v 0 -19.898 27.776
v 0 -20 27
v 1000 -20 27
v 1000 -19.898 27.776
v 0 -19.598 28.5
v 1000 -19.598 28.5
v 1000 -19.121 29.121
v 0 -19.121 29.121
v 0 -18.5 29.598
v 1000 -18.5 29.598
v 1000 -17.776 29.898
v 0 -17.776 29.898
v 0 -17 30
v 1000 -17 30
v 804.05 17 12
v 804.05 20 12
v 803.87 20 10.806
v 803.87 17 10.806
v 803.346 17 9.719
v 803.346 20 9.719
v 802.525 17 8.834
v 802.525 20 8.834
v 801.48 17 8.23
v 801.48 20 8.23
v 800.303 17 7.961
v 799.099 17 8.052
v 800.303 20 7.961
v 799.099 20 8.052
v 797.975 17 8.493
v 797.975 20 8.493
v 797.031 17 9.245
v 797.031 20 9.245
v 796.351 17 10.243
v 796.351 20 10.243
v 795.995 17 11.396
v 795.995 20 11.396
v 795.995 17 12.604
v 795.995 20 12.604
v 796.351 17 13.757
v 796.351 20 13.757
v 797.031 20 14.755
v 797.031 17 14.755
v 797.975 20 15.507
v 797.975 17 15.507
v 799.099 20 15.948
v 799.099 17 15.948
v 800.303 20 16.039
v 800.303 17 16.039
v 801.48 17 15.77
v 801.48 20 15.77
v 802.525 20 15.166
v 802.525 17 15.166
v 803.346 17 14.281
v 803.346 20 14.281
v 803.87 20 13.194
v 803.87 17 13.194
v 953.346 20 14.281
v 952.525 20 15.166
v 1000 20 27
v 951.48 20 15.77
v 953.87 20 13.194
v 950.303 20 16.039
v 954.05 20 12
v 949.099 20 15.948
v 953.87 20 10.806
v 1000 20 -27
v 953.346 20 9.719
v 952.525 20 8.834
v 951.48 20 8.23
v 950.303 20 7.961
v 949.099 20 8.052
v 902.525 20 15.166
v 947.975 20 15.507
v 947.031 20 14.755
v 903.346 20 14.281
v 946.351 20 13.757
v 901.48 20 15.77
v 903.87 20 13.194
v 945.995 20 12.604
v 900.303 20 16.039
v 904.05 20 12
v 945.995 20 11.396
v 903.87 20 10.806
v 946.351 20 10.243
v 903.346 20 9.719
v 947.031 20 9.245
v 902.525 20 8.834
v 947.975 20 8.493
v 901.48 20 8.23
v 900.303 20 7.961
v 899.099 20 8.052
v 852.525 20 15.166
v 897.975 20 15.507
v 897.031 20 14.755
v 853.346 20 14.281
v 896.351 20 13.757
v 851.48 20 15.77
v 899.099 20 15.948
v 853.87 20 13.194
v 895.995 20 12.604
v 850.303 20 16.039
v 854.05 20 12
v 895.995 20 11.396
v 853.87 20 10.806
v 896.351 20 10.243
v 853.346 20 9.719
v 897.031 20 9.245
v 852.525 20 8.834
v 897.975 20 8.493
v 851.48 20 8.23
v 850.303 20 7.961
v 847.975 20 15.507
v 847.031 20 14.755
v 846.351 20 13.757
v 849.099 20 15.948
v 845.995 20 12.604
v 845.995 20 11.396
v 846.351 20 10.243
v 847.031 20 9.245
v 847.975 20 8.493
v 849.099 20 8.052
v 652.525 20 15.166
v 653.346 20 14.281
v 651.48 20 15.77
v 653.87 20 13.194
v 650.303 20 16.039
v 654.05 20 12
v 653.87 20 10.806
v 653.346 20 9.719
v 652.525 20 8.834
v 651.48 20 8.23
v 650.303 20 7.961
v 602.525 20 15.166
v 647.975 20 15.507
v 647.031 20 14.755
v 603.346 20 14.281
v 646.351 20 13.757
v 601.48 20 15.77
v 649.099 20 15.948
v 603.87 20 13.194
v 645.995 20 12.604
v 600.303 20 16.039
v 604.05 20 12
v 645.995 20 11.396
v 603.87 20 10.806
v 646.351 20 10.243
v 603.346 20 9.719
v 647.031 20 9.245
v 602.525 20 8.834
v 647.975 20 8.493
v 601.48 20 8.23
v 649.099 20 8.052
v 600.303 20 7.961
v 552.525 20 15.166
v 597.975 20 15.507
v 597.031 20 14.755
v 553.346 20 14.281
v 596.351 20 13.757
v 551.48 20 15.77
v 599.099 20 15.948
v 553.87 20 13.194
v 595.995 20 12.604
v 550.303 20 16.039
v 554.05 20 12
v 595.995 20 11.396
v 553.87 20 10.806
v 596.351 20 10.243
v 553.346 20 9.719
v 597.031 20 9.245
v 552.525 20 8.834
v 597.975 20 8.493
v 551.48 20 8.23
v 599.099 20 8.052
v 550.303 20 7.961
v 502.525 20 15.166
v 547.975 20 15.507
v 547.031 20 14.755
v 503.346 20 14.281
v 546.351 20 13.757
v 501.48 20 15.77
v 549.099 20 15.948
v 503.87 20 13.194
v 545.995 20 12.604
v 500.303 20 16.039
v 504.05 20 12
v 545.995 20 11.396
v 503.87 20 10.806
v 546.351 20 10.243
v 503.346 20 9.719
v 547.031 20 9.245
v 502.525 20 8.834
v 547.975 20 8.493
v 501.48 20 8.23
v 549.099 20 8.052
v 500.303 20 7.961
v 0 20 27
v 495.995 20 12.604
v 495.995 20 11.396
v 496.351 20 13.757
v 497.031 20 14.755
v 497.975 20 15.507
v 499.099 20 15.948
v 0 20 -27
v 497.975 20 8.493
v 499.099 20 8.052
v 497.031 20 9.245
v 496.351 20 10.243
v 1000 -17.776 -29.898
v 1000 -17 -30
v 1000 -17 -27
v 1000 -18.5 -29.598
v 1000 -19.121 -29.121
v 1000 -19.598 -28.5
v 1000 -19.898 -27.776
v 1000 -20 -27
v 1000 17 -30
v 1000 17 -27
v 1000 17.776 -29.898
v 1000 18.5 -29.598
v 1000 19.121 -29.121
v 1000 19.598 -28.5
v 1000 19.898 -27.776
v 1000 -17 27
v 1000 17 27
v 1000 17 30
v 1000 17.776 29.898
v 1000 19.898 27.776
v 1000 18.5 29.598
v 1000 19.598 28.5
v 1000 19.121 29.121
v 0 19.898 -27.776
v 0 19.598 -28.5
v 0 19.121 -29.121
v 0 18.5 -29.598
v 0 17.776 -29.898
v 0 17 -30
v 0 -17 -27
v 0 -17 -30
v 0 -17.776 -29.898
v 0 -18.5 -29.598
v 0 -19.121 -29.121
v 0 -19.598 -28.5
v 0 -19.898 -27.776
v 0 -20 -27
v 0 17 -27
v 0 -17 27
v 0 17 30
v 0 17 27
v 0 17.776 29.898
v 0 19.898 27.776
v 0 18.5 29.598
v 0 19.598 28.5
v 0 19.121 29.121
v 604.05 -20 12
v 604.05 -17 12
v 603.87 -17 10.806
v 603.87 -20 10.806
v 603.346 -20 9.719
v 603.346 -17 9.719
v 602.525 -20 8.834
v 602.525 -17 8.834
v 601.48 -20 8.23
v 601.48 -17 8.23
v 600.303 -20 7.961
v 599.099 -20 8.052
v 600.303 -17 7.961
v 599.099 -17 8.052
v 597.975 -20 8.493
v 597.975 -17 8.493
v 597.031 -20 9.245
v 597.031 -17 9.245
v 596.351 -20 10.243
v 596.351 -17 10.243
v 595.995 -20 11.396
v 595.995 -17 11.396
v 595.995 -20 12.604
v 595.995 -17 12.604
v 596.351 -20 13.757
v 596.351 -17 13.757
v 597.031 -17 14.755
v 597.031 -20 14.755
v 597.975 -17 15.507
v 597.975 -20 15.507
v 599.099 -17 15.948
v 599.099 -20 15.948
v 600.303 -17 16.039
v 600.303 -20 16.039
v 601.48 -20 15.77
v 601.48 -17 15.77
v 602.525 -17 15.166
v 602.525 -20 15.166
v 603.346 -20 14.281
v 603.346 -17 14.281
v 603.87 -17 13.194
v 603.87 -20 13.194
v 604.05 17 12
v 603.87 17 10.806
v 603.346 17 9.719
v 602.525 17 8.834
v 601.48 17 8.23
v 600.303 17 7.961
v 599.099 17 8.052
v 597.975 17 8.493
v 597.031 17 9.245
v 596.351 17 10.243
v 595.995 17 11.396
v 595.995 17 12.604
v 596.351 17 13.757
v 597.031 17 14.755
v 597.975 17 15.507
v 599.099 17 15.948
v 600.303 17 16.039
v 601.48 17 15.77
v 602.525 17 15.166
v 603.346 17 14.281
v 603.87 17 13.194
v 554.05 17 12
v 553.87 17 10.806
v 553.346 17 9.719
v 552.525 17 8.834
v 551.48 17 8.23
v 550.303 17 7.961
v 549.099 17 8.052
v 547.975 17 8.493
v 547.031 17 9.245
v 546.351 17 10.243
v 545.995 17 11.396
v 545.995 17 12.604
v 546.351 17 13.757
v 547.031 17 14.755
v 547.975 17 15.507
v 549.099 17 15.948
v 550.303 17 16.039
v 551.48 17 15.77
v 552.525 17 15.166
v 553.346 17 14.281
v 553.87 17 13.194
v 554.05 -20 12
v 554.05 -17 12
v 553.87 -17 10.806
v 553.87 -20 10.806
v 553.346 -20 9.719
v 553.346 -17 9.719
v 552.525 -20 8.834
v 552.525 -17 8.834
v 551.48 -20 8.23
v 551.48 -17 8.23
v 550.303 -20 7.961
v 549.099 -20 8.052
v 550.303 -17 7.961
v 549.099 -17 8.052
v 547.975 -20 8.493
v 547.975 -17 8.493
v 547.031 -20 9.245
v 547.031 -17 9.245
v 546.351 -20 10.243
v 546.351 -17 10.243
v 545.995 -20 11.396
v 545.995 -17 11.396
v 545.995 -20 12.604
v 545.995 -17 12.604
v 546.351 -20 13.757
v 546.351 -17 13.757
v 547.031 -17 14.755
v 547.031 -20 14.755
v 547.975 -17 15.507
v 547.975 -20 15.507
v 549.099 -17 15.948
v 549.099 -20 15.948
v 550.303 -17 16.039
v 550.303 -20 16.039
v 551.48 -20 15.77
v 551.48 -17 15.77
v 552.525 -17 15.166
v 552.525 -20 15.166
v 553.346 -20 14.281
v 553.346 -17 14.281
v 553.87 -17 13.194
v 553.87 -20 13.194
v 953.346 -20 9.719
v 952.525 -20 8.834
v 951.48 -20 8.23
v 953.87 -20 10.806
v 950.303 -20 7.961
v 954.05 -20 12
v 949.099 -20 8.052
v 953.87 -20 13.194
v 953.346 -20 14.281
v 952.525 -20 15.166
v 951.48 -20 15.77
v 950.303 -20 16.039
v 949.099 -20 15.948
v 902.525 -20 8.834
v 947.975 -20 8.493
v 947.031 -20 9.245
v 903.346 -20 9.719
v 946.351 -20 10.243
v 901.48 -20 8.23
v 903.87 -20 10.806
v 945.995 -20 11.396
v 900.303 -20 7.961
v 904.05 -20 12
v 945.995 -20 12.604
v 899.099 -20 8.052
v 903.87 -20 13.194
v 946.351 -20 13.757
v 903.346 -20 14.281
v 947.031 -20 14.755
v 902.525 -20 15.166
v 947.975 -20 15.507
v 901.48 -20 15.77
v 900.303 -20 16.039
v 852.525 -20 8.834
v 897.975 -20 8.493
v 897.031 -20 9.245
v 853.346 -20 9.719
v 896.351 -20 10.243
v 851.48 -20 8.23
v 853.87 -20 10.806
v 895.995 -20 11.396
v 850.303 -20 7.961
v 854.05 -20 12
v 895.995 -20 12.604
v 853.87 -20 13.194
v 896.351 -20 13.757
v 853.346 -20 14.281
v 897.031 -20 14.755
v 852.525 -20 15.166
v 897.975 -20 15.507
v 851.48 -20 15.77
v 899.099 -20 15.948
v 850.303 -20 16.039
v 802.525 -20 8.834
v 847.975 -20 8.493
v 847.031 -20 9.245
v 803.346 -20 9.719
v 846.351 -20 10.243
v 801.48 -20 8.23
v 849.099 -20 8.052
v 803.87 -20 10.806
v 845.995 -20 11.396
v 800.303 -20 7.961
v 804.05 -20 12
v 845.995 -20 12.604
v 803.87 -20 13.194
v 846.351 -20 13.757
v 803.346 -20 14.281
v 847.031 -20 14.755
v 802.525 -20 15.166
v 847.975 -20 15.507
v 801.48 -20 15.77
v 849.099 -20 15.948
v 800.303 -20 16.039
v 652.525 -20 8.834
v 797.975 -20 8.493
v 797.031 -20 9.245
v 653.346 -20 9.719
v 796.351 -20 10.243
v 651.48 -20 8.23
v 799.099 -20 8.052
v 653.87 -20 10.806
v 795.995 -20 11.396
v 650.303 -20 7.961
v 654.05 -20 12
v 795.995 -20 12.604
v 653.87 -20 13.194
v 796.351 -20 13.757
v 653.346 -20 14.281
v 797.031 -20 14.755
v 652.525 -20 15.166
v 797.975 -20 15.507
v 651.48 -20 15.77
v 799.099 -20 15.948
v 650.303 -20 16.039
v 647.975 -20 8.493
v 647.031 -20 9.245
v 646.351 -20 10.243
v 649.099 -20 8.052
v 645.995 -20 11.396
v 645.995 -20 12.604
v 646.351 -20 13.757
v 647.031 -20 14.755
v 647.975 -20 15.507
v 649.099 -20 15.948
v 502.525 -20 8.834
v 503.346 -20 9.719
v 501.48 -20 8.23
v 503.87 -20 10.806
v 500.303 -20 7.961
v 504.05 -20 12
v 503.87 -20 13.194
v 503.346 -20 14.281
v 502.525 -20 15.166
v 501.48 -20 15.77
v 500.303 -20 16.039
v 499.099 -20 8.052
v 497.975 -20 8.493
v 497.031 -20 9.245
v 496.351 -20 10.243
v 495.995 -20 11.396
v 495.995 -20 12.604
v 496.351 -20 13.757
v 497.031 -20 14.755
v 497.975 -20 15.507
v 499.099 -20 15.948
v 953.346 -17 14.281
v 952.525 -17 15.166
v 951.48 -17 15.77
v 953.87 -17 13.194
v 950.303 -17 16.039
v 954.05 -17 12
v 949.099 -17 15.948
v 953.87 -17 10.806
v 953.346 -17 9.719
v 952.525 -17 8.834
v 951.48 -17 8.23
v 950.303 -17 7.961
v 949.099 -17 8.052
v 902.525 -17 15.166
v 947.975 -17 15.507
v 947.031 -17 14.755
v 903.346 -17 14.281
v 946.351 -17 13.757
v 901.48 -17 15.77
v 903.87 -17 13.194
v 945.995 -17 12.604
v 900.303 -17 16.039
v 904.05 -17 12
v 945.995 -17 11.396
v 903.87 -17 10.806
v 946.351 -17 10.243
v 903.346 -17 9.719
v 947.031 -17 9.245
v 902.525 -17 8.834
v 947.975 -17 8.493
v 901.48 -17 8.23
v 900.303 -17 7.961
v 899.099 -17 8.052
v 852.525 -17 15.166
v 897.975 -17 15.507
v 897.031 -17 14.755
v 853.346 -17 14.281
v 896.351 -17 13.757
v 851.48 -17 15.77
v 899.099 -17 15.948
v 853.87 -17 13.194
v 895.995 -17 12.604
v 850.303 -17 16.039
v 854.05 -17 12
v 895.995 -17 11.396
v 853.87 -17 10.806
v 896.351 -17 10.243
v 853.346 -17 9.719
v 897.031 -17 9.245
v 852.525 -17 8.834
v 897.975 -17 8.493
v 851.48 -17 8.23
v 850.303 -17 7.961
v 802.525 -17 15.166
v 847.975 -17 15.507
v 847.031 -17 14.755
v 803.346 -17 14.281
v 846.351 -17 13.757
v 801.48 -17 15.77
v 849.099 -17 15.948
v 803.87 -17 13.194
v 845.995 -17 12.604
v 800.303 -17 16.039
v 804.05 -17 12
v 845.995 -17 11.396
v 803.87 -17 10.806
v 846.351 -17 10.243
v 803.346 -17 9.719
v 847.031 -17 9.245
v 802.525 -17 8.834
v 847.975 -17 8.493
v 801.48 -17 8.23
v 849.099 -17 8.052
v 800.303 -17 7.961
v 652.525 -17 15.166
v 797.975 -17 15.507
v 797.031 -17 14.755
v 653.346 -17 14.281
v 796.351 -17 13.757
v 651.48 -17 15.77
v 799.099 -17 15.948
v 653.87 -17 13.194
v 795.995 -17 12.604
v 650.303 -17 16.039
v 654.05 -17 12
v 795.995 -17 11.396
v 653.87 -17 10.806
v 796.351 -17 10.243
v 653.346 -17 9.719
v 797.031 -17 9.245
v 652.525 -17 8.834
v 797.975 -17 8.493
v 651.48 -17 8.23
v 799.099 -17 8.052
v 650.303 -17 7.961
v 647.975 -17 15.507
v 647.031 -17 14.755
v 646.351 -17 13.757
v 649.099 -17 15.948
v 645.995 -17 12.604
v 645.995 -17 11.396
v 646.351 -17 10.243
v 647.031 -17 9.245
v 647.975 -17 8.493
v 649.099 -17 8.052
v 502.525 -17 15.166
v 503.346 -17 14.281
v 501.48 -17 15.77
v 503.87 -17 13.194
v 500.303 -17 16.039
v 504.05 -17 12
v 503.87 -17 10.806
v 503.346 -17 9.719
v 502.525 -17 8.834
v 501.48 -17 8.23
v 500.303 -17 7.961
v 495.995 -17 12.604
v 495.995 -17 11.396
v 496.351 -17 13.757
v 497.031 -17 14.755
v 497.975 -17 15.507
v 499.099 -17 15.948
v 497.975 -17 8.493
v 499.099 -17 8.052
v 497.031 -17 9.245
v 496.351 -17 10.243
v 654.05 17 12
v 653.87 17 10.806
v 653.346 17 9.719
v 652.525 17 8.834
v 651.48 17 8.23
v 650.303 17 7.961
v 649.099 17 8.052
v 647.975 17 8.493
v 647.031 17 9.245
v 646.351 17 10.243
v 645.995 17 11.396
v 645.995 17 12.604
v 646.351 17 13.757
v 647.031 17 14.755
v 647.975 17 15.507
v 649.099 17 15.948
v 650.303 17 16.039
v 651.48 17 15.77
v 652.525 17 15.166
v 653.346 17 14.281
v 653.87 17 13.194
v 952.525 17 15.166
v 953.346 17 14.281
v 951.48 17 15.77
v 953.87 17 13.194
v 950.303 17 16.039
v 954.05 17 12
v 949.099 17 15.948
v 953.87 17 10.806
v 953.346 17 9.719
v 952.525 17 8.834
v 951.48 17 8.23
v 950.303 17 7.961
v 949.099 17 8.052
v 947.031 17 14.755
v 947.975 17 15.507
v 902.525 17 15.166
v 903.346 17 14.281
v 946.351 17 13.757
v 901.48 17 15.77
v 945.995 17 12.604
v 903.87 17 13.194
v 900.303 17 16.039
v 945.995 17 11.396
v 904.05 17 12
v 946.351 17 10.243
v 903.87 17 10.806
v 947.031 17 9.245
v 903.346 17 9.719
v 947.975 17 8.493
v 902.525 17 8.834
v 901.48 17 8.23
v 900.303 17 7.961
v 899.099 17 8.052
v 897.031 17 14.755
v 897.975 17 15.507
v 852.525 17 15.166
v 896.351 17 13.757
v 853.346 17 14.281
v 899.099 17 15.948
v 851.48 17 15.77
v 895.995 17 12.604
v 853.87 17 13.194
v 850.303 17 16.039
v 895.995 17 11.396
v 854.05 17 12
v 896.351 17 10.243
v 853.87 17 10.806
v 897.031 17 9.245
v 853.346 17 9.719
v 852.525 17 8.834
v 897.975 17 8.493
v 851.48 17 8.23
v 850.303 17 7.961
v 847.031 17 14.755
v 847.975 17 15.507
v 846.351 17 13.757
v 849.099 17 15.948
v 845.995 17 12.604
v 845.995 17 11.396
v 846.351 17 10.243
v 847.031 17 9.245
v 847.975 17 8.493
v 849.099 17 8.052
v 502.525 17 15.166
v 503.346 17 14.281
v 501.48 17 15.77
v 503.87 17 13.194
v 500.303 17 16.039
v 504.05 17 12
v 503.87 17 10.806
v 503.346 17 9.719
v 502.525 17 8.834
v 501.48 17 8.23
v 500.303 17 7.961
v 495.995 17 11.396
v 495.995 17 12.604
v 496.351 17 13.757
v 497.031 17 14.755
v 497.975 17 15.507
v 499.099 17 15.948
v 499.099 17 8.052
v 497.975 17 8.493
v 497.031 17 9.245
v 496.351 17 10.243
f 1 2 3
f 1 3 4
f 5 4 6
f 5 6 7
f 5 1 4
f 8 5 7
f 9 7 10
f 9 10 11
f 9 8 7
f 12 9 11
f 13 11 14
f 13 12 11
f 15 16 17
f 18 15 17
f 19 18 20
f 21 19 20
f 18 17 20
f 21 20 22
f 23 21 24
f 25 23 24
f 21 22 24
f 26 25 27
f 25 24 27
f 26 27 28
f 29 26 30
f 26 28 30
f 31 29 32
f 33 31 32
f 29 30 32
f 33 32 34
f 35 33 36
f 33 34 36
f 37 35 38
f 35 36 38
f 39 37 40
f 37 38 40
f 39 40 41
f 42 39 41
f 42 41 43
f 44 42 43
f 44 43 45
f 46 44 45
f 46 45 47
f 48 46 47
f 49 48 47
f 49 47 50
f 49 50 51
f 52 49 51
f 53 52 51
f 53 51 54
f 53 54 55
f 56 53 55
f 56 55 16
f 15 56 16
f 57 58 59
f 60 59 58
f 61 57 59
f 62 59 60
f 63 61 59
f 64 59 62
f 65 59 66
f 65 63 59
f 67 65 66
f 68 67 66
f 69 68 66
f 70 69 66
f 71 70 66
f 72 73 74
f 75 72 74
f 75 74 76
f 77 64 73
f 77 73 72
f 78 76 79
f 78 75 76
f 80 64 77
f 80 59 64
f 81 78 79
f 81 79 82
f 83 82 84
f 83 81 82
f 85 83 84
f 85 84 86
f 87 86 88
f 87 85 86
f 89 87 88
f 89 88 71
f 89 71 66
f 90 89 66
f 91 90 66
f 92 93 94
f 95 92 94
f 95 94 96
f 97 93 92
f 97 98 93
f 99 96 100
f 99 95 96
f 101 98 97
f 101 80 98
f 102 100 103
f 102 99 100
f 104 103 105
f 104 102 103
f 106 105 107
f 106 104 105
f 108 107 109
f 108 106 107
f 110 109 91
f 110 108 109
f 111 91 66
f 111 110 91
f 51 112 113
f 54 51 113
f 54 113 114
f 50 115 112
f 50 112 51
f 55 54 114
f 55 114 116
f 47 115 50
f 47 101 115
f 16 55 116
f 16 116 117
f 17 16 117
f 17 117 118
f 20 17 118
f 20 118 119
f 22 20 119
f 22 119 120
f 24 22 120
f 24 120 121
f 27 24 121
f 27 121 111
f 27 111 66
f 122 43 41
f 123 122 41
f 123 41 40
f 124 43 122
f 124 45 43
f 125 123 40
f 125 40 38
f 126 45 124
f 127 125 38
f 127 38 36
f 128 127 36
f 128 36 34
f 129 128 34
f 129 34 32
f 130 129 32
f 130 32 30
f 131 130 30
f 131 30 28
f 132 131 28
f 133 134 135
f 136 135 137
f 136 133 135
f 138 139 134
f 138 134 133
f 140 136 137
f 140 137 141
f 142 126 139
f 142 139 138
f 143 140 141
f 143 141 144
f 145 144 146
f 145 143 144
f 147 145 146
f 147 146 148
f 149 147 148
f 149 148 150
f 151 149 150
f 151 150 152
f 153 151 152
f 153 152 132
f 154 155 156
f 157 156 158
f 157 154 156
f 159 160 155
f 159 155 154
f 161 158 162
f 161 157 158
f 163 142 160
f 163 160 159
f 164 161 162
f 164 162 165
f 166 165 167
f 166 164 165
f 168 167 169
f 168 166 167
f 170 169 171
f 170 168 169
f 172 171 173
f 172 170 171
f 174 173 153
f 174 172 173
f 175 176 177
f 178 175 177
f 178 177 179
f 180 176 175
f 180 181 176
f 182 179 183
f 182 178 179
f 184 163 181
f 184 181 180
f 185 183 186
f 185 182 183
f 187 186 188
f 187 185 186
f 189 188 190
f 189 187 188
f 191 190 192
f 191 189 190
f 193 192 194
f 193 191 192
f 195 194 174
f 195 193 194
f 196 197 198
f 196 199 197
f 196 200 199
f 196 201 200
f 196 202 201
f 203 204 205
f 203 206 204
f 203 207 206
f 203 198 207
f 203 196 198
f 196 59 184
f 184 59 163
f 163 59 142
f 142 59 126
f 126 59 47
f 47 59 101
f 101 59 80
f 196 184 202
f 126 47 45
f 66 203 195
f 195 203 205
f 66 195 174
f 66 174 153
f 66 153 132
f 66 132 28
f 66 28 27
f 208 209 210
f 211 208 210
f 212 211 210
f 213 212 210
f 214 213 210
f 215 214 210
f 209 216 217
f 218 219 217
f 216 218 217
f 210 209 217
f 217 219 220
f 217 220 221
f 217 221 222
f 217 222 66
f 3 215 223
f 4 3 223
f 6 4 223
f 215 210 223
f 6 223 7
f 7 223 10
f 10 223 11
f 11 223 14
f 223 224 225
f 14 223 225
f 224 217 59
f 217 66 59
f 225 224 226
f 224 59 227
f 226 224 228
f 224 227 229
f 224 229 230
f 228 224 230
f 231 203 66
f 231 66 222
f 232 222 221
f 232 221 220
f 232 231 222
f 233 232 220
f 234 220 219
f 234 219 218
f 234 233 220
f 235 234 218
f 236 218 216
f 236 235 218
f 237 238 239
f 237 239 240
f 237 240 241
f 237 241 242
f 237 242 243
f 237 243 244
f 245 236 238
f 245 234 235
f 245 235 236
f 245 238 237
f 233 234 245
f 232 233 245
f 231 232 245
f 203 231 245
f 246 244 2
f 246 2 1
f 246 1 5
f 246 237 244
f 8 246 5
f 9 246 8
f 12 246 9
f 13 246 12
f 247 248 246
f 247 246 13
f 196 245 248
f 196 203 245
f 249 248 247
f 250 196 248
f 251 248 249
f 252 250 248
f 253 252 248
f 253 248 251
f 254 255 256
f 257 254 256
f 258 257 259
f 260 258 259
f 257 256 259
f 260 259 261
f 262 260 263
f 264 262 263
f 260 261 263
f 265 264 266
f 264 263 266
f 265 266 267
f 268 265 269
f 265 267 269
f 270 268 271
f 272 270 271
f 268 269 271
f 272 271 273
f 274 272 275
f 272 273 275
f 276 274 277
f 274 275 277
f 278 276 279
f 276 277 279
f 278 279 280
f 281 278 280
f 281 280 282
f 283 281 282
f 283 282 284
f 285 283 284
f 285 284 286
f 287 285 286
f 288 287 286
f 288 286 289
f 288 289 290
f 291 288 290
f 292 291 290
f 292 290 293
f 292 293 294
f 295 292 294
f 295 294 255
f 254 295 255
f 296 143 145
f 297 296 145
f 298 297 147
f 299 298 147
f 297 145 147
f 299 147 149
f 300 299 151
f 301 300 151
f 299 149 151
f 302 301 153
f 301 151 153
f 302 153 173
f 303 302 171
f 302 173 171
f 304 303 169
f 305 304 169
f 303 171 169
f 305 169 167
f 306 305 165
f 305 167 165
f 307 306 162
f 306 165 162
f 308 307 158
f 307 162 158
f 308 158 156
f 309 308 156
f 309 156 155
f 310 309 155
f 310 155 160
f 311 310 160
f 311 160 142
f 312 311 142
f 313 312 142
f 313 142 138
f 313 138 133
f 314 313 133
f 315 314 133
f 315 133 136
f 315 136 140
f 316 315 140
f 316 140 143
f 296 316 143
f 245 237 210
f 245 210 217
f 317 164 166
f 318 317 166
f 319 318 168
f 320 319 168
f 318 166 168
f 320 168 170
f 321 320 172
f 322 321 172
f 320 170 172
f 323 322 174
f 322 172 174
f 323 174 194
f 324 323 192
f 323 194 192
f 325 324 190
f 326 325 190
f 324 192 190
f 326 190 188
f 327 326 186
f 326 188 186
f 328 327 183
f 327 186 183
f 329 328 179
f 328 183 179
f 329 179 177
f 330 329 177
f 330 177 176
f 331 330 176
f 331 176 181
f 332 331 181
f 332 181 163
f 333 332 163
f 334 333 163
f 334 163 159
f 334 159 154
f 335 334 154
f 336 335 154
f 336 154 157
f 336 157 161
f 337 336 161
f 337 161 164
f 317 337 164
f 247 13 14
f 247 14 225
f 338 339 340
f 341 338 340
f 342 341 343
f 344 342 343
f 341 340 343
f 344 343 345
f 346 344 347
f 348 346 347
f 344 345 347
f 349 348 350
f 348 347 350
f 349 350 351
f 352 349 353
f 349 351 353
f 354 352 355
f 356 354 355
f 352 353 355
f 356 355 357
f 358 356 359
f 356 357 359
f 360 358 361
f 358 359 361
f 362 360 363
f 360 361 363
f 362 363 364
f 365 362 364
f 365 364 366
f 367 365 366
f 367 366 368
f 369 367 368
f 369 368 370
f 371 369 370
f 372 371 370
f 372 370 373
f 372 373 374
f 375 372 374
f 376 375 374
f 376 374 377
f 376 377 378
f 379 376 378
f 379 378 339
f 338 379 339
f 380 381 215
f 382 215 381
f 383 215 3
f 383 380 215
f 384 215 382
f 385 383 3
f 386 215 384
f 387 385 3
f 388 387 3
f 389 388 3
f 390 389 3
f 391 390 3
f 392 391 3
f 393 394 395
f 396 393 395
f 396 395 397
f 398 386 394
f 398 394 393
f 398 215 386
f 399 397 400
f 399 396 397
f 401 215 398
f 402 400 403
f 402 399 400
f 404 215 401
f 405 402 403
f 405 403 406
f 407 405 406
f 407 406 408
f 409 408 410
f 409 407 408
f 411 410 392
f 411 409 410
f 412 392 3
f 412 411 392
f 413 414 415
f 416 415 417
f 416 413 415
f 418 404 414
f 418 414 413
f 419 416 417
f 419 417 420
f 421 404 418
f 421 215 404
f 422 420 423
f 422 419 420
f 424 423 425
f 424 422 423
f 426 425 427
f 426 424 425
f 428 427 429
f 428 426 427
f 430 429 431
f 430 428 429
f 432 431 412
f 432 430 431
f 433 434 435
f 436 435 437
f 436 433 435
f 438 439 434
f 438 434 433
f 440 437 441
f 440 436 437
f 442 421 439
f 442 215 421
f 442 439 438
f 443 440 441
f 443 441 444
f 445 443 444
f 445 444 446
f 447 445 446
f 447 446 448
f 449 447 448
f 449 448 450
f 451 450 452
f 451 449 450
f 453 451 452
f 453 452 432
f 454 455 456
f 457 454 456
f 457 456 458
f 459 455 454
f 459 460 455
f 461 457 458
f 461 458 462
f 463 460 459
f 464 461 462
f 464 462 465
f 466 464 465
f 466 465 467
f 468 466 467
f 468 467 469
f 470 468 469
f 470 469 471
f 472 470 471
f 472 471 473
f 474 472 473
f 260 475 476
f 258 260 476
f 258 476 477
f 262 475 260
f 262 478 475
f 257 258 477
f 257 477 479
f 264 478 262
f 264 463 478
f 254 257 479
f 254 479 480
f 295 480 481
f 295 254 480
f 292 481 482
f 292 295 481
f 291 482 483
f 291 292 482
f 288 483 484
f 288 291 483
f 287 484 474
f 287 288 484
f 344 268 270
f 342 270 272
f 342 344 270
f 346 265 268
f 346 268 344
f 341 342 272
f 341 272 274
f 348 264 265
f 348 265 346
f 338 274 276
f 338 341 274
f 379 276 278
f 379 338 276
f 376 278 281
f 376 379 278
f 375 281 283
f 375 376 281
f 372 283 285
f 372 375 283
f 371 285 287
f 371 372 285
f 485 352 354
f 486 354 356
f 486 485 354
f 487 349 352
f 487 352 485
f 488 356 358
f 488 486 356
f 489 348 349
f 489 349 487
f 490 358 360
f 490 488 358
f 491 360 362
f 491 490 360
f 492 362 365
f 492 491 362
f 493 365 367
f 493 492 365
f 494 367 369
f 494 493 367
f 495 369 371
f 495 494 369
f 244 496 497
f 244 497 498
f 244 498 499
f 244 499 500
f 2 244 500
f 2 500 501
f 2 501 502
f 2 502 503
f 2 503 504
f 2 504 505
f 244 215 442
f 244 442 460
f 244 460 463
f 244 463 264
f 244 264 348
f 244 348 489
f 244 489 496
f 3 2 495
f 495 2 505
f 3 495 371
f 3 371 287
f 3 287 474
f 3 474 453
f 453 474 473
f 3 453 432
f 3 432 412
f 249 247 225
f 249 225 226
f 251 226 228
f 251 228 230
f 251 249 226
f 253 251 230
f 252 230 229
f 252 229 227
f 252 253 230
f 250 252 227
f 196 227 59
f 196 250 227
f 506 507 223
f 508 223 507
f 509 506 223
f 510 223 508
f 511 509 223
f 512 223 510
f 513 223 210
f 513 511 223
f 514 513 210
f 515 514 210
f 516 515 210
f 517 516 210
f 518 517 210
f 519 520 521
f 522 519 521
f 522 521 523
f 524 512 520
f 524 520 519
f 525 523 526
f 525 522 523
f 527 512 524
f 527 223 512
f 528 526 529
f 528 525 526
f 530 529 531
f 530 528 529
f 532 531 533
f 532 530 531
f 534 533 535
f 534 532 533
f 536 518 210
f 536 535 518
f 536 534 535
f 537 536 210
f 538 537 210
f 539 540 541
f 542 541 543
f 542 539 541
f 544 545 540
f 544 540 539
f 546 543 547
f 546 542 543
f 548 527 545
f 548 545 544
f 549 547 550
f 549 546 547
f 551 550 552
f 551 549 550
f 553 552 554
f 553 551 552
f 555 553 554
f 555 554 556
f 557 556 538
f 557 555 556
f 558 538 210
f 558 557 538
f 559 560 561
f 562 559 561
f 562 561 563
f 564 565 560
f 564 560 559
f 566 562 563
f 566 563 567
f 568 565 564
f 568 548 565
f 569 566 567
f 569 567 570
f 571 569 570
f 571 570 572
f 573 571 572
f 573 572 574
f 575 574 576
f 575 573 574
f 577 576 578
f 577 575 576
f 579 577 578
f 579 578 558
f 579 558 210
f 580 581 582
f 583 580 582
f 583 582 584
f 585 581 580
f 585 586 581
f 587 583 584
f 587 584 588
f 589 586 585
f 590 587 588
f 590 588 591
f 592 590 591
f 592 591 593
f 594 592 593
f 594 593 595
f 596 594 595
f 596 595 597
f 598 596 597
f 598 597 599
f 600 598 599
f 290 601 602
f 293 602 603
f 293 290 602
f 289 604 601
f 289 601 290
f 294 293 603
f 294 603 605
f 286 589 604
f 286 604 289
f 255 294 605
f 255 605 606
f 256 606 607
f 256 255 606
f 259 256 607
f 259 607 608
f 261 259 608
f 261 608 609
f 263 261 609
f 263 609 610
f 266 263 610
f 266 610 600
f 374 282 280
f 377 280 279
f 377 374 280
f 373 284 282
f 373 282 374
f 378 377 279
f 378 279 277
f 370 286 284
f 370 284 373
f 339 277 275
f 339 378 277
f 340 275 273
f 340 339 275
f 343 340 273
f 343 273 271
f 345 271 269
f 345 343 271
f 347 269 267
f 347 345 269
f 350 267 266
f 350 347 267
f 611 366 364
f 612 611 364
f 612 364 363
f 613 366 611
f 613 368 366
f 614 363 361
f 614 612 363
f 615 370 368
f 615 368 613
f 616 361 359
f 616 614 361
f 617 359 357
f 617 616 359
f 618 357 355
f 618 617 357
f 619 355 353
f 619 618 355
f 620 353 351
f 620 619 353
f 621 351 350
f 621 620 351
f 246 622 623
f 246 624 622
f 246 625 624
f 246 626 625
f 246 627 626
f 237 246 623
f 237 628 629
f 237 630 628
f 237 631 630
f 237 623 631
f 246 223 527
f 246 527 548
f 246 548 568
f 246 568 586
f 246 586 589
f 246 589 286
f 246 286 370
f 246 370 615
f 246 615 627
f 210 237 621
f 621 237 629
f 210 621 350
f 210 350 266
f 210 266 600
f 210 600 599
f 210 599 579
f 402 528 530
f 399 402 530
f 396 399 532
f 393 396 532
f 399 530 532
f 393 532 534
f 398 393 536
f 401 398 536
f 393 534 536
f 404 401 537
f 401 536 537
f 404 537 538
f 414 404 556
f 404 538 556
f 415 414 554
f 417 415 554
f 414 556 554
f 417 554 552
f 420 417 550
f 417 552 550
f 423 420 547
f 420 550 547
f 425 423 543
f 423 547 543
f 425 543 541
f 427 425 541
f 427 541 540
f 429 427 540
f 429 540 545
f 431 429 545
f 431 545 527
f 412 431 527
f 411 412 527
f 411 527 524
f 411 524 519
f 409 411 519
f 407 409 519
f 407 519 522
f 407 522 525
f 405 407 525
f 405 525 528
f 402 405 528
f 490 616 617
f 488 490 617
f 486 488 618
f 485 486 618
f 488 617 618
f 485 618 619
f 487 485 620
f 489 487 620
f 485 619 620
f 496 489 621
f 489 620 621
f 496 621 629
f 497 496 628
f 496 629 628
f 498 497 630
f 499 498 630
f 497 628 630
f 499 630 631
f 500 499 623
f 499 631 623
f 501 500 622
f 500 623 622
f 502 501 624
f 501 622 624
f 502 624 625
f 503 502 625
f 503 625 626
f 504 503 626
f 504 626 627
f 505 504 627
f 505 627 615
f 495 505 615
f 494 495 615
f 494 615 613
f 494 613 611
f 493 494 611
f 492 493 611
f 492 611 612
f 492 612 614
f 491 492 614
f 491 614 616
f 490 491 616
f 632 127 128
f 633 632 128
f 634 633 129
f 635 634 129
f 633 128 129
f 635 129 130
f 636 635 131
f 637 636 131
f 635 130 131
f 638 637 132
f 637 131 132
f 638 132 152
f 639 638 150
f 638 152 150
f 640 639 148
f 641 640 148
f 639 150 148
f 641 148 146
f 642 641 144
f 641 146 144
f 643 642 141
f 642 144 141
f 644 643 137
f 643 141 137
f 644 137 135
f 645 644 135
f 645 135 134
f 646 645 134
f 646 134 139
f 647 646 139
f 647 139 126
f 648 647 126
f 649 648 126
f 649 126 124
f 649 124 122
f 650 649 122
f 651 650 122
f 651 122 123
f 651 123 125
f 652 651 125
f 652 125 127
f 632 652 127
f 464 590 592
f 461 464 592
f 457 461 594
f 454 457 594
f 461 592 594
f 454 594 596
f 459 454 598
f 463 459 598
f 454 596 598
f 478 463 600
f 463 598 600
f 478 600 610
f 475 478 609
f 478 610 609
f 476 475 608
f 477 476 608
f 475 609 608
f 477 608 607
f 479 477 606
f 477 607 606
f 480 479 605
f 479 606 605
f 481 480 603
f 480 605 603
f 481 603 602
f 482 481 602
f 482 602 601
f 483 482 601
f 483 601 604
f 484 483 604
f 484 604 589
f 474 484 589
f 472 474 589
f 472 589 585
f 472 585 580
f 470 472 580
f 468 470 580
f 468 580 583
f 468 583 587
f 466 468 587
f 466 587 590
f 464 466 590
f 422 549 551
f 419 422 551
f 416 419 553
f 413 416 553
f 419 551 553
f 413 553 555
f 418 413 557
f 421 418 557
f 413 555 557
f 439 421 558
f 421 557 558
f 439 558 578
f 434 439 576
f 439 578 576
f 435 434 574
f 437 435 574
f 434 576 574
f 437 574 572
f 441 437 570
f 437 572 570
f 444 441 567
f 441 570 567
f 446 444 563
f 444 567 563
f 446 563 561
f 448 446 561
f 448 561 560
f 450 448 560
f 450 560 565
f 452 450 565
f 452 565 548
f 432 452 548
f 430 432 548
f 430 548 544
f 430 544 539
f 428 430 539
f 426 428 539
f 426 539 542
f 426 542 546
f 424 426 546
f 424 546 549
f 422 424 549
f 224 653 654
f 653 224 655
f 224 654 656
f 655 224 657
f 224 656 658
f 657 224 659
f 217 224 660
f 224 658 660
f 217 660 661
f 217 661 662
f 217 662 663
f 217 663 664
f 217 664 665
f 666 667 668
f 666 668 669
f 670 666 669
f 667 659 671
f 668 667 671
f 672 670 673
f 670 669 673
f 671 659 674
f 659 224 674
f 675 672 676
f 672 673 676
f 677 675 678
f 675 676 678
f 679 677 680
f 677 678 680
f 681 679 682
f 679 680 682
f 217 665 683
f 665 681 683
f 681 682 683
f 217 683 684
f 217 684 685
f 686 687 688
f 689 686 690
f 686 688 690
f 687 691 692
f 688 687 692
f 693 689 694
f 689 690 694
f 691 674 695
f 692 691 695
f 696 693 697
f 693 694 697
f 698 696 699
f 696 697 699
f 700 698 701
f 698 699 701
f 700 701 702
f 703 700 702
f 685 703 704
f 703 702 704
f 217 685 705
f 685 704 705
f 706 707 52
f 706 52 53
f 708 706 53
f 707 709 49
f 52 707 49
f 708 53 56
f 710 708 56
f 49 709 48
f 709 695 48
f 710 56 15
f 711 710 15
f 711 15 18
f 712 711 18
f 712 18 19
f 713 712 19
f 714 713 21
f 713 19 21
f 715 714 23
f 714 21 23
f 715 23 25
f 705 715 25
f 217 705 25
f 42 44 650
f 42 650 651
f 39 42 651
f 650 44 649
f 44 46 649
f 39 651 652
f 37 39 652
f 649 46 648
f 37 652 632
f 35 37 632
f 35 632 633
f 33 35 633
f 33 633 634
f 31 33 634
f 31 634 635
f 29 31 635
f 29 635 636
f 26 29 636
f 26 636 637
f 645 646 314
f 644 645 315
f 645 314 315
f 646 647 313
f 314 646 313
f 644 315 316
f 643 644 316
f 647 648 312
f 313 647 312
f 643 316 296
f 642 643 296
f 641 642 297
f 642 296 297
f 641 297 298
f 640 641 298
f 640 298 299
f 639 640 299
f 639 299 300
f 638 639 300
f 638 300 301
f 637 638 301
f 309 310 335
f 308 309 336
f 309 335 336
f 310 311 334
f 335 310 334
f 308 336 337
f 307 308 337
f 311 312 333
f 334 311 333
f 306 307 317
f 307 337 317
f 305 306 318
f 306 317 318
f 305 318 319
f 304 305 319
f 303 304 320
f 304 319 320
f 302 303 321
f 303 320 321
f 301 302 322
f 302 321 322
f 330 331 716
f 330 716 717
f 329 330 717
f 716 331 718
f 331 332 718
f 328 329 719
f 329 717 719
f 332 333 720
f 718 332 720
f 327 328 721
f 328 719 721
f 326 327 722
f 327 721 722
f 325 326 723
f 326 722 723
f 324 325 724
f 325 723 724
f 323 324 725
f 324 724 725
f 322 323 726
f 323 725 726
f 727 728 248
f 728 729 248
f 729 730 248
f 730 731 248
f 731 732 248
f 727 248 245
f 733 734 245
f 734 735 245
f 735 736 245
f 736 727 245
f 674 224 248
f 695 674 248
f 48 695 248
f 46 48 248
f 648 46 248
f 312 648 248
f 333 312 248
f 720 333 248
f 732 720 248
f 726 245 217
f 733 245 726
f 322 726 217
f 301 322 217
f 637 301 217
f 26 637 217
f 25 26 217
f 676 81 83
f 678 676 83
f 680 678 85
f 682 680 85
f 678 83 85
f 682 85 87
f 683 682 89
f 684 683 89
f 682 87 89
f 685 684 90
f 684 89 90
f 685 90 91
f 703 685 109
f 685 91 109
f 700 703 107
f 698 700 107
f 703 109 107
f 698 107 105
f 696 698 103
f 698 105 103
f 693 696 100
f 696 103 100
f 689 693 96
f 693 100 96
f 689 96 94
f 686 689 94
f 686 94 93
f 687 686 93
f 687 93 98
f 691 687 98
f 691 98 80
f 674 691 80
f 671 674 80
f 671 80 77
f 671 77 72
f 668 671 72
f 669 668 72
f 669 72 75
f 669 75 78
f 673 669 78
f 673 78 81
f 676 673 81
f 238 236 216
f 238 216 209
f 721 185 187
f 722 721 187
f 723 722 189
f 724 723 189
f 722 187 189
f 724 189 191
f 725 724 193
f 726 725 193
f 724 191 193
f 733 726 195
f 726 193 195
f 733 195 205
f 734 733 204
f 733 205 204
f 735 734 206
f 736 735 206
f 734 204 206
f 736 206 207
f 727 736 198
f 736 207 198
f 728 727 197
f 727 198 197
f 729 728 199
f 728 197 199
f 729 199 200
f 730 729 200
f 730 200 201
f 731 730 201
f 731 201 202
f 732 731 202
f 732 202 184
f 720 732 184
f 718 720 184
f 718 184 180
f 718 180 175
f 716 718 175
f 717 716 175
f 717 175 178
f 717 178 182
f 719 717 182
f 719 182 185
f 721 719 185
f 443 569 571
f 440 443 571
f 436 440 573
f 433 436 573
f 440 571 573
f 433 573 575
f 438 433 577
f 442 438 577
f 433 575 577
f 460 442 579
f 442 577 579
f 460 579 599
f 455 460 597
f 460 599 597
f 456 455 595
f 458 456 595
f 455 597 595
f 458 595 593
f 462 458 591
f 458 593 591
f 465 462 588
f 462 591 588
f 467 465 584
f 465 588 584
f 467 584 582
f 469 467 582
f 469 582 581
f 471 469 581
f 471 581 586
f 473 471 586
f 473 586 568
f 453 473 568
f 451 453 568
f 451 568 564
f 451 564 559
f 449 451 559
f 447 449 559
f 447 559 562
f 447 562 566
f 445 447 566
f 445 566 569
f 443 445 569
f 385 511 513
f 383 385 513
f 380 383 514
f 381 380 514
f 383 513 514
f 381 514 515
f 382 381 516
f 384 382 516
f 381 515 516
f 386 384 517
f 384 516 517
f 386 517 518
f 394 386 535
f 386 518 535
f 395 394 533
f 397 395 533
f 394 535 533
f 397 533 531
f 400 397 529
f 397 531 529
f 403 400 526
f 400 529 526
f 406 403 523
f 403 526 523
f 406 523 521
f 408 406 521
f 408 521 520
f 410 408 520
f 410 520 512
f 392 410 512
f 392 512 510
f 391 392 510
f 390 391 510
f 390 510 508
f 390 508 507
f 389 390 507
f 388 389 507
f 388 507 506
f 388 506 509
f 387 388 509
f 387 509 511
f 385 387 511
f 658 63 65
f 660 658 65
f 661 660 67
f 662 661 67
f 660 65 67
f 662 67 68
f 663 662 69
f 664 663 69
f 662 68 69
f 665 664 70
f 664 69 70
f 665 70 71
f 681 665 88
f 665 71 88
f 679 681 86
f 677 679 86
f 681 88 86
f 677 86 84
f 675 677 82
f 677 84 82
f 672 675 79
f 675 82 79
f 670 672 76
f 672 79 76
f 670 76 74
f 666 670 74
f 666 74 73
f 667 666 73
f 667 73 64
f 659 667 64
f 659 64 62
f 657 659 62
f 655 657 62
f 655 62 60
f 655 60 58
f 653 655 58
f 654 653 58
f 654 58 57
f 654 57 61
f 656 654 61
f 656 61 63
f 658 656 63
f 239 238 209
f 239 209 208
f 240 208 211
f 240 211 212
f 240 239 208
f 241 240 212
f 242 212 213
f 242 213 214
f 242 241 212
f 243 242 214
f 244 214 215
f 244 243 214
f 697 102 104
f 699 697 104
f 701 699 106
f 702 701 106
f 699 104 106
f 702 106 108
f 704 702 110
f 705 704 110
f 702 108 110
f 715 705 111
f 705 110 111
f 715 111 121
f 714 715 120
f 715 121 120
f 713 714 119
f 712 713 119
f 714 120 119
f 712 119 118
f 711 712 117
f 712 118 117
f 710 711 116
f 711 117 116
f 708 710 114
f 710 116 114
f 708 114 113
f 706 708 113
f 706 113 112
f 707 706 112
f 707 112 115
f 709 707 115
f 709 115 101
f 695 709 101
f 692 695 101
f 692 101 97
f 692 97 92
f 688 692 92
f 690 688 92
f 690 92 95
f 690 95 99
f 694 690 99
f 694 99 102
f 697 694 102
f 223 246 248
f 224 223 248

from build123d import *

# Parameters (mm, degrees)
SKETCH_1_W          = 54
SKETCH_1_H          = 34
EXTRUDE_1_DEPTH     = 1000
SKETCH_2_R          = 4.05
CUT_EXTRUDE_1_DEPTH = 41


with BuildPart() as part:
    # Эскиз1 → Вытянуть-Тонкостенный1 (new body)
    with BuildSketch(Plane(origin=(0, 0, 0), x_dir=(0, 0, -1), z_dir=(1, 0, 0))):
        with BuildLine():
            Line((30, 17), (30, -17))
            ThreePointArc((30, -17), (29.121320344, -19.121320344), (27, -20))
            Line((27, -20), (-27, -20))
            ThreePointArc((-27, -20), (-29.121320344, -19.121320344), (-30, -17))
            Line((-30, -17), (-30, 17))
            ThreePointArc((-30, 17), (-29.121320344, 19.121320344), (-27, 20))
            Line((-27, 20), (27, 20))
            ThreePointArc((27, 20), (29.121320344, 19.121320344), (30, 17))
        make_face()
        Rectangle(SKETCH_1_W, SKETCH_1_H, mode=Mode.SUBTRACT)
    extrude(amount=EXTRUDE_1_DEPTH)

    # Эскиз2 → Вырез-Вытянуть1 (cut, through all)
    with BuildSketch(Plane(origin=(0, 20, 0), x_dir=(1, 0, 0), z_dir=(0, 1, 0))):
        with Locations((950, -12)):
            Circle(SKETCH_2_R)
        with Locations((900, -12)):
            Circle(SKETCH_2_R)
        with Locations((850, -12)):
            Circle(SKETCH_2_R)
        with Locations((800, -12)):
            Circle(SKETCH_2_R)
        with Locations((650, -12)):
            Circle(SKETCH_2_R)
        with Locations((600, -12)):
            Circle(SKETCH_2_R)
        with Locations((550, -12)):
            Circle(SKETCH_2_R)
        with Locations((500, -12)):
            Circle(SKETCH_2_R)
    extrude(amount=-CUT_EXTRUDE_1_DEPTH, mode=Mode.SUBTRACT)


solid = part.part
